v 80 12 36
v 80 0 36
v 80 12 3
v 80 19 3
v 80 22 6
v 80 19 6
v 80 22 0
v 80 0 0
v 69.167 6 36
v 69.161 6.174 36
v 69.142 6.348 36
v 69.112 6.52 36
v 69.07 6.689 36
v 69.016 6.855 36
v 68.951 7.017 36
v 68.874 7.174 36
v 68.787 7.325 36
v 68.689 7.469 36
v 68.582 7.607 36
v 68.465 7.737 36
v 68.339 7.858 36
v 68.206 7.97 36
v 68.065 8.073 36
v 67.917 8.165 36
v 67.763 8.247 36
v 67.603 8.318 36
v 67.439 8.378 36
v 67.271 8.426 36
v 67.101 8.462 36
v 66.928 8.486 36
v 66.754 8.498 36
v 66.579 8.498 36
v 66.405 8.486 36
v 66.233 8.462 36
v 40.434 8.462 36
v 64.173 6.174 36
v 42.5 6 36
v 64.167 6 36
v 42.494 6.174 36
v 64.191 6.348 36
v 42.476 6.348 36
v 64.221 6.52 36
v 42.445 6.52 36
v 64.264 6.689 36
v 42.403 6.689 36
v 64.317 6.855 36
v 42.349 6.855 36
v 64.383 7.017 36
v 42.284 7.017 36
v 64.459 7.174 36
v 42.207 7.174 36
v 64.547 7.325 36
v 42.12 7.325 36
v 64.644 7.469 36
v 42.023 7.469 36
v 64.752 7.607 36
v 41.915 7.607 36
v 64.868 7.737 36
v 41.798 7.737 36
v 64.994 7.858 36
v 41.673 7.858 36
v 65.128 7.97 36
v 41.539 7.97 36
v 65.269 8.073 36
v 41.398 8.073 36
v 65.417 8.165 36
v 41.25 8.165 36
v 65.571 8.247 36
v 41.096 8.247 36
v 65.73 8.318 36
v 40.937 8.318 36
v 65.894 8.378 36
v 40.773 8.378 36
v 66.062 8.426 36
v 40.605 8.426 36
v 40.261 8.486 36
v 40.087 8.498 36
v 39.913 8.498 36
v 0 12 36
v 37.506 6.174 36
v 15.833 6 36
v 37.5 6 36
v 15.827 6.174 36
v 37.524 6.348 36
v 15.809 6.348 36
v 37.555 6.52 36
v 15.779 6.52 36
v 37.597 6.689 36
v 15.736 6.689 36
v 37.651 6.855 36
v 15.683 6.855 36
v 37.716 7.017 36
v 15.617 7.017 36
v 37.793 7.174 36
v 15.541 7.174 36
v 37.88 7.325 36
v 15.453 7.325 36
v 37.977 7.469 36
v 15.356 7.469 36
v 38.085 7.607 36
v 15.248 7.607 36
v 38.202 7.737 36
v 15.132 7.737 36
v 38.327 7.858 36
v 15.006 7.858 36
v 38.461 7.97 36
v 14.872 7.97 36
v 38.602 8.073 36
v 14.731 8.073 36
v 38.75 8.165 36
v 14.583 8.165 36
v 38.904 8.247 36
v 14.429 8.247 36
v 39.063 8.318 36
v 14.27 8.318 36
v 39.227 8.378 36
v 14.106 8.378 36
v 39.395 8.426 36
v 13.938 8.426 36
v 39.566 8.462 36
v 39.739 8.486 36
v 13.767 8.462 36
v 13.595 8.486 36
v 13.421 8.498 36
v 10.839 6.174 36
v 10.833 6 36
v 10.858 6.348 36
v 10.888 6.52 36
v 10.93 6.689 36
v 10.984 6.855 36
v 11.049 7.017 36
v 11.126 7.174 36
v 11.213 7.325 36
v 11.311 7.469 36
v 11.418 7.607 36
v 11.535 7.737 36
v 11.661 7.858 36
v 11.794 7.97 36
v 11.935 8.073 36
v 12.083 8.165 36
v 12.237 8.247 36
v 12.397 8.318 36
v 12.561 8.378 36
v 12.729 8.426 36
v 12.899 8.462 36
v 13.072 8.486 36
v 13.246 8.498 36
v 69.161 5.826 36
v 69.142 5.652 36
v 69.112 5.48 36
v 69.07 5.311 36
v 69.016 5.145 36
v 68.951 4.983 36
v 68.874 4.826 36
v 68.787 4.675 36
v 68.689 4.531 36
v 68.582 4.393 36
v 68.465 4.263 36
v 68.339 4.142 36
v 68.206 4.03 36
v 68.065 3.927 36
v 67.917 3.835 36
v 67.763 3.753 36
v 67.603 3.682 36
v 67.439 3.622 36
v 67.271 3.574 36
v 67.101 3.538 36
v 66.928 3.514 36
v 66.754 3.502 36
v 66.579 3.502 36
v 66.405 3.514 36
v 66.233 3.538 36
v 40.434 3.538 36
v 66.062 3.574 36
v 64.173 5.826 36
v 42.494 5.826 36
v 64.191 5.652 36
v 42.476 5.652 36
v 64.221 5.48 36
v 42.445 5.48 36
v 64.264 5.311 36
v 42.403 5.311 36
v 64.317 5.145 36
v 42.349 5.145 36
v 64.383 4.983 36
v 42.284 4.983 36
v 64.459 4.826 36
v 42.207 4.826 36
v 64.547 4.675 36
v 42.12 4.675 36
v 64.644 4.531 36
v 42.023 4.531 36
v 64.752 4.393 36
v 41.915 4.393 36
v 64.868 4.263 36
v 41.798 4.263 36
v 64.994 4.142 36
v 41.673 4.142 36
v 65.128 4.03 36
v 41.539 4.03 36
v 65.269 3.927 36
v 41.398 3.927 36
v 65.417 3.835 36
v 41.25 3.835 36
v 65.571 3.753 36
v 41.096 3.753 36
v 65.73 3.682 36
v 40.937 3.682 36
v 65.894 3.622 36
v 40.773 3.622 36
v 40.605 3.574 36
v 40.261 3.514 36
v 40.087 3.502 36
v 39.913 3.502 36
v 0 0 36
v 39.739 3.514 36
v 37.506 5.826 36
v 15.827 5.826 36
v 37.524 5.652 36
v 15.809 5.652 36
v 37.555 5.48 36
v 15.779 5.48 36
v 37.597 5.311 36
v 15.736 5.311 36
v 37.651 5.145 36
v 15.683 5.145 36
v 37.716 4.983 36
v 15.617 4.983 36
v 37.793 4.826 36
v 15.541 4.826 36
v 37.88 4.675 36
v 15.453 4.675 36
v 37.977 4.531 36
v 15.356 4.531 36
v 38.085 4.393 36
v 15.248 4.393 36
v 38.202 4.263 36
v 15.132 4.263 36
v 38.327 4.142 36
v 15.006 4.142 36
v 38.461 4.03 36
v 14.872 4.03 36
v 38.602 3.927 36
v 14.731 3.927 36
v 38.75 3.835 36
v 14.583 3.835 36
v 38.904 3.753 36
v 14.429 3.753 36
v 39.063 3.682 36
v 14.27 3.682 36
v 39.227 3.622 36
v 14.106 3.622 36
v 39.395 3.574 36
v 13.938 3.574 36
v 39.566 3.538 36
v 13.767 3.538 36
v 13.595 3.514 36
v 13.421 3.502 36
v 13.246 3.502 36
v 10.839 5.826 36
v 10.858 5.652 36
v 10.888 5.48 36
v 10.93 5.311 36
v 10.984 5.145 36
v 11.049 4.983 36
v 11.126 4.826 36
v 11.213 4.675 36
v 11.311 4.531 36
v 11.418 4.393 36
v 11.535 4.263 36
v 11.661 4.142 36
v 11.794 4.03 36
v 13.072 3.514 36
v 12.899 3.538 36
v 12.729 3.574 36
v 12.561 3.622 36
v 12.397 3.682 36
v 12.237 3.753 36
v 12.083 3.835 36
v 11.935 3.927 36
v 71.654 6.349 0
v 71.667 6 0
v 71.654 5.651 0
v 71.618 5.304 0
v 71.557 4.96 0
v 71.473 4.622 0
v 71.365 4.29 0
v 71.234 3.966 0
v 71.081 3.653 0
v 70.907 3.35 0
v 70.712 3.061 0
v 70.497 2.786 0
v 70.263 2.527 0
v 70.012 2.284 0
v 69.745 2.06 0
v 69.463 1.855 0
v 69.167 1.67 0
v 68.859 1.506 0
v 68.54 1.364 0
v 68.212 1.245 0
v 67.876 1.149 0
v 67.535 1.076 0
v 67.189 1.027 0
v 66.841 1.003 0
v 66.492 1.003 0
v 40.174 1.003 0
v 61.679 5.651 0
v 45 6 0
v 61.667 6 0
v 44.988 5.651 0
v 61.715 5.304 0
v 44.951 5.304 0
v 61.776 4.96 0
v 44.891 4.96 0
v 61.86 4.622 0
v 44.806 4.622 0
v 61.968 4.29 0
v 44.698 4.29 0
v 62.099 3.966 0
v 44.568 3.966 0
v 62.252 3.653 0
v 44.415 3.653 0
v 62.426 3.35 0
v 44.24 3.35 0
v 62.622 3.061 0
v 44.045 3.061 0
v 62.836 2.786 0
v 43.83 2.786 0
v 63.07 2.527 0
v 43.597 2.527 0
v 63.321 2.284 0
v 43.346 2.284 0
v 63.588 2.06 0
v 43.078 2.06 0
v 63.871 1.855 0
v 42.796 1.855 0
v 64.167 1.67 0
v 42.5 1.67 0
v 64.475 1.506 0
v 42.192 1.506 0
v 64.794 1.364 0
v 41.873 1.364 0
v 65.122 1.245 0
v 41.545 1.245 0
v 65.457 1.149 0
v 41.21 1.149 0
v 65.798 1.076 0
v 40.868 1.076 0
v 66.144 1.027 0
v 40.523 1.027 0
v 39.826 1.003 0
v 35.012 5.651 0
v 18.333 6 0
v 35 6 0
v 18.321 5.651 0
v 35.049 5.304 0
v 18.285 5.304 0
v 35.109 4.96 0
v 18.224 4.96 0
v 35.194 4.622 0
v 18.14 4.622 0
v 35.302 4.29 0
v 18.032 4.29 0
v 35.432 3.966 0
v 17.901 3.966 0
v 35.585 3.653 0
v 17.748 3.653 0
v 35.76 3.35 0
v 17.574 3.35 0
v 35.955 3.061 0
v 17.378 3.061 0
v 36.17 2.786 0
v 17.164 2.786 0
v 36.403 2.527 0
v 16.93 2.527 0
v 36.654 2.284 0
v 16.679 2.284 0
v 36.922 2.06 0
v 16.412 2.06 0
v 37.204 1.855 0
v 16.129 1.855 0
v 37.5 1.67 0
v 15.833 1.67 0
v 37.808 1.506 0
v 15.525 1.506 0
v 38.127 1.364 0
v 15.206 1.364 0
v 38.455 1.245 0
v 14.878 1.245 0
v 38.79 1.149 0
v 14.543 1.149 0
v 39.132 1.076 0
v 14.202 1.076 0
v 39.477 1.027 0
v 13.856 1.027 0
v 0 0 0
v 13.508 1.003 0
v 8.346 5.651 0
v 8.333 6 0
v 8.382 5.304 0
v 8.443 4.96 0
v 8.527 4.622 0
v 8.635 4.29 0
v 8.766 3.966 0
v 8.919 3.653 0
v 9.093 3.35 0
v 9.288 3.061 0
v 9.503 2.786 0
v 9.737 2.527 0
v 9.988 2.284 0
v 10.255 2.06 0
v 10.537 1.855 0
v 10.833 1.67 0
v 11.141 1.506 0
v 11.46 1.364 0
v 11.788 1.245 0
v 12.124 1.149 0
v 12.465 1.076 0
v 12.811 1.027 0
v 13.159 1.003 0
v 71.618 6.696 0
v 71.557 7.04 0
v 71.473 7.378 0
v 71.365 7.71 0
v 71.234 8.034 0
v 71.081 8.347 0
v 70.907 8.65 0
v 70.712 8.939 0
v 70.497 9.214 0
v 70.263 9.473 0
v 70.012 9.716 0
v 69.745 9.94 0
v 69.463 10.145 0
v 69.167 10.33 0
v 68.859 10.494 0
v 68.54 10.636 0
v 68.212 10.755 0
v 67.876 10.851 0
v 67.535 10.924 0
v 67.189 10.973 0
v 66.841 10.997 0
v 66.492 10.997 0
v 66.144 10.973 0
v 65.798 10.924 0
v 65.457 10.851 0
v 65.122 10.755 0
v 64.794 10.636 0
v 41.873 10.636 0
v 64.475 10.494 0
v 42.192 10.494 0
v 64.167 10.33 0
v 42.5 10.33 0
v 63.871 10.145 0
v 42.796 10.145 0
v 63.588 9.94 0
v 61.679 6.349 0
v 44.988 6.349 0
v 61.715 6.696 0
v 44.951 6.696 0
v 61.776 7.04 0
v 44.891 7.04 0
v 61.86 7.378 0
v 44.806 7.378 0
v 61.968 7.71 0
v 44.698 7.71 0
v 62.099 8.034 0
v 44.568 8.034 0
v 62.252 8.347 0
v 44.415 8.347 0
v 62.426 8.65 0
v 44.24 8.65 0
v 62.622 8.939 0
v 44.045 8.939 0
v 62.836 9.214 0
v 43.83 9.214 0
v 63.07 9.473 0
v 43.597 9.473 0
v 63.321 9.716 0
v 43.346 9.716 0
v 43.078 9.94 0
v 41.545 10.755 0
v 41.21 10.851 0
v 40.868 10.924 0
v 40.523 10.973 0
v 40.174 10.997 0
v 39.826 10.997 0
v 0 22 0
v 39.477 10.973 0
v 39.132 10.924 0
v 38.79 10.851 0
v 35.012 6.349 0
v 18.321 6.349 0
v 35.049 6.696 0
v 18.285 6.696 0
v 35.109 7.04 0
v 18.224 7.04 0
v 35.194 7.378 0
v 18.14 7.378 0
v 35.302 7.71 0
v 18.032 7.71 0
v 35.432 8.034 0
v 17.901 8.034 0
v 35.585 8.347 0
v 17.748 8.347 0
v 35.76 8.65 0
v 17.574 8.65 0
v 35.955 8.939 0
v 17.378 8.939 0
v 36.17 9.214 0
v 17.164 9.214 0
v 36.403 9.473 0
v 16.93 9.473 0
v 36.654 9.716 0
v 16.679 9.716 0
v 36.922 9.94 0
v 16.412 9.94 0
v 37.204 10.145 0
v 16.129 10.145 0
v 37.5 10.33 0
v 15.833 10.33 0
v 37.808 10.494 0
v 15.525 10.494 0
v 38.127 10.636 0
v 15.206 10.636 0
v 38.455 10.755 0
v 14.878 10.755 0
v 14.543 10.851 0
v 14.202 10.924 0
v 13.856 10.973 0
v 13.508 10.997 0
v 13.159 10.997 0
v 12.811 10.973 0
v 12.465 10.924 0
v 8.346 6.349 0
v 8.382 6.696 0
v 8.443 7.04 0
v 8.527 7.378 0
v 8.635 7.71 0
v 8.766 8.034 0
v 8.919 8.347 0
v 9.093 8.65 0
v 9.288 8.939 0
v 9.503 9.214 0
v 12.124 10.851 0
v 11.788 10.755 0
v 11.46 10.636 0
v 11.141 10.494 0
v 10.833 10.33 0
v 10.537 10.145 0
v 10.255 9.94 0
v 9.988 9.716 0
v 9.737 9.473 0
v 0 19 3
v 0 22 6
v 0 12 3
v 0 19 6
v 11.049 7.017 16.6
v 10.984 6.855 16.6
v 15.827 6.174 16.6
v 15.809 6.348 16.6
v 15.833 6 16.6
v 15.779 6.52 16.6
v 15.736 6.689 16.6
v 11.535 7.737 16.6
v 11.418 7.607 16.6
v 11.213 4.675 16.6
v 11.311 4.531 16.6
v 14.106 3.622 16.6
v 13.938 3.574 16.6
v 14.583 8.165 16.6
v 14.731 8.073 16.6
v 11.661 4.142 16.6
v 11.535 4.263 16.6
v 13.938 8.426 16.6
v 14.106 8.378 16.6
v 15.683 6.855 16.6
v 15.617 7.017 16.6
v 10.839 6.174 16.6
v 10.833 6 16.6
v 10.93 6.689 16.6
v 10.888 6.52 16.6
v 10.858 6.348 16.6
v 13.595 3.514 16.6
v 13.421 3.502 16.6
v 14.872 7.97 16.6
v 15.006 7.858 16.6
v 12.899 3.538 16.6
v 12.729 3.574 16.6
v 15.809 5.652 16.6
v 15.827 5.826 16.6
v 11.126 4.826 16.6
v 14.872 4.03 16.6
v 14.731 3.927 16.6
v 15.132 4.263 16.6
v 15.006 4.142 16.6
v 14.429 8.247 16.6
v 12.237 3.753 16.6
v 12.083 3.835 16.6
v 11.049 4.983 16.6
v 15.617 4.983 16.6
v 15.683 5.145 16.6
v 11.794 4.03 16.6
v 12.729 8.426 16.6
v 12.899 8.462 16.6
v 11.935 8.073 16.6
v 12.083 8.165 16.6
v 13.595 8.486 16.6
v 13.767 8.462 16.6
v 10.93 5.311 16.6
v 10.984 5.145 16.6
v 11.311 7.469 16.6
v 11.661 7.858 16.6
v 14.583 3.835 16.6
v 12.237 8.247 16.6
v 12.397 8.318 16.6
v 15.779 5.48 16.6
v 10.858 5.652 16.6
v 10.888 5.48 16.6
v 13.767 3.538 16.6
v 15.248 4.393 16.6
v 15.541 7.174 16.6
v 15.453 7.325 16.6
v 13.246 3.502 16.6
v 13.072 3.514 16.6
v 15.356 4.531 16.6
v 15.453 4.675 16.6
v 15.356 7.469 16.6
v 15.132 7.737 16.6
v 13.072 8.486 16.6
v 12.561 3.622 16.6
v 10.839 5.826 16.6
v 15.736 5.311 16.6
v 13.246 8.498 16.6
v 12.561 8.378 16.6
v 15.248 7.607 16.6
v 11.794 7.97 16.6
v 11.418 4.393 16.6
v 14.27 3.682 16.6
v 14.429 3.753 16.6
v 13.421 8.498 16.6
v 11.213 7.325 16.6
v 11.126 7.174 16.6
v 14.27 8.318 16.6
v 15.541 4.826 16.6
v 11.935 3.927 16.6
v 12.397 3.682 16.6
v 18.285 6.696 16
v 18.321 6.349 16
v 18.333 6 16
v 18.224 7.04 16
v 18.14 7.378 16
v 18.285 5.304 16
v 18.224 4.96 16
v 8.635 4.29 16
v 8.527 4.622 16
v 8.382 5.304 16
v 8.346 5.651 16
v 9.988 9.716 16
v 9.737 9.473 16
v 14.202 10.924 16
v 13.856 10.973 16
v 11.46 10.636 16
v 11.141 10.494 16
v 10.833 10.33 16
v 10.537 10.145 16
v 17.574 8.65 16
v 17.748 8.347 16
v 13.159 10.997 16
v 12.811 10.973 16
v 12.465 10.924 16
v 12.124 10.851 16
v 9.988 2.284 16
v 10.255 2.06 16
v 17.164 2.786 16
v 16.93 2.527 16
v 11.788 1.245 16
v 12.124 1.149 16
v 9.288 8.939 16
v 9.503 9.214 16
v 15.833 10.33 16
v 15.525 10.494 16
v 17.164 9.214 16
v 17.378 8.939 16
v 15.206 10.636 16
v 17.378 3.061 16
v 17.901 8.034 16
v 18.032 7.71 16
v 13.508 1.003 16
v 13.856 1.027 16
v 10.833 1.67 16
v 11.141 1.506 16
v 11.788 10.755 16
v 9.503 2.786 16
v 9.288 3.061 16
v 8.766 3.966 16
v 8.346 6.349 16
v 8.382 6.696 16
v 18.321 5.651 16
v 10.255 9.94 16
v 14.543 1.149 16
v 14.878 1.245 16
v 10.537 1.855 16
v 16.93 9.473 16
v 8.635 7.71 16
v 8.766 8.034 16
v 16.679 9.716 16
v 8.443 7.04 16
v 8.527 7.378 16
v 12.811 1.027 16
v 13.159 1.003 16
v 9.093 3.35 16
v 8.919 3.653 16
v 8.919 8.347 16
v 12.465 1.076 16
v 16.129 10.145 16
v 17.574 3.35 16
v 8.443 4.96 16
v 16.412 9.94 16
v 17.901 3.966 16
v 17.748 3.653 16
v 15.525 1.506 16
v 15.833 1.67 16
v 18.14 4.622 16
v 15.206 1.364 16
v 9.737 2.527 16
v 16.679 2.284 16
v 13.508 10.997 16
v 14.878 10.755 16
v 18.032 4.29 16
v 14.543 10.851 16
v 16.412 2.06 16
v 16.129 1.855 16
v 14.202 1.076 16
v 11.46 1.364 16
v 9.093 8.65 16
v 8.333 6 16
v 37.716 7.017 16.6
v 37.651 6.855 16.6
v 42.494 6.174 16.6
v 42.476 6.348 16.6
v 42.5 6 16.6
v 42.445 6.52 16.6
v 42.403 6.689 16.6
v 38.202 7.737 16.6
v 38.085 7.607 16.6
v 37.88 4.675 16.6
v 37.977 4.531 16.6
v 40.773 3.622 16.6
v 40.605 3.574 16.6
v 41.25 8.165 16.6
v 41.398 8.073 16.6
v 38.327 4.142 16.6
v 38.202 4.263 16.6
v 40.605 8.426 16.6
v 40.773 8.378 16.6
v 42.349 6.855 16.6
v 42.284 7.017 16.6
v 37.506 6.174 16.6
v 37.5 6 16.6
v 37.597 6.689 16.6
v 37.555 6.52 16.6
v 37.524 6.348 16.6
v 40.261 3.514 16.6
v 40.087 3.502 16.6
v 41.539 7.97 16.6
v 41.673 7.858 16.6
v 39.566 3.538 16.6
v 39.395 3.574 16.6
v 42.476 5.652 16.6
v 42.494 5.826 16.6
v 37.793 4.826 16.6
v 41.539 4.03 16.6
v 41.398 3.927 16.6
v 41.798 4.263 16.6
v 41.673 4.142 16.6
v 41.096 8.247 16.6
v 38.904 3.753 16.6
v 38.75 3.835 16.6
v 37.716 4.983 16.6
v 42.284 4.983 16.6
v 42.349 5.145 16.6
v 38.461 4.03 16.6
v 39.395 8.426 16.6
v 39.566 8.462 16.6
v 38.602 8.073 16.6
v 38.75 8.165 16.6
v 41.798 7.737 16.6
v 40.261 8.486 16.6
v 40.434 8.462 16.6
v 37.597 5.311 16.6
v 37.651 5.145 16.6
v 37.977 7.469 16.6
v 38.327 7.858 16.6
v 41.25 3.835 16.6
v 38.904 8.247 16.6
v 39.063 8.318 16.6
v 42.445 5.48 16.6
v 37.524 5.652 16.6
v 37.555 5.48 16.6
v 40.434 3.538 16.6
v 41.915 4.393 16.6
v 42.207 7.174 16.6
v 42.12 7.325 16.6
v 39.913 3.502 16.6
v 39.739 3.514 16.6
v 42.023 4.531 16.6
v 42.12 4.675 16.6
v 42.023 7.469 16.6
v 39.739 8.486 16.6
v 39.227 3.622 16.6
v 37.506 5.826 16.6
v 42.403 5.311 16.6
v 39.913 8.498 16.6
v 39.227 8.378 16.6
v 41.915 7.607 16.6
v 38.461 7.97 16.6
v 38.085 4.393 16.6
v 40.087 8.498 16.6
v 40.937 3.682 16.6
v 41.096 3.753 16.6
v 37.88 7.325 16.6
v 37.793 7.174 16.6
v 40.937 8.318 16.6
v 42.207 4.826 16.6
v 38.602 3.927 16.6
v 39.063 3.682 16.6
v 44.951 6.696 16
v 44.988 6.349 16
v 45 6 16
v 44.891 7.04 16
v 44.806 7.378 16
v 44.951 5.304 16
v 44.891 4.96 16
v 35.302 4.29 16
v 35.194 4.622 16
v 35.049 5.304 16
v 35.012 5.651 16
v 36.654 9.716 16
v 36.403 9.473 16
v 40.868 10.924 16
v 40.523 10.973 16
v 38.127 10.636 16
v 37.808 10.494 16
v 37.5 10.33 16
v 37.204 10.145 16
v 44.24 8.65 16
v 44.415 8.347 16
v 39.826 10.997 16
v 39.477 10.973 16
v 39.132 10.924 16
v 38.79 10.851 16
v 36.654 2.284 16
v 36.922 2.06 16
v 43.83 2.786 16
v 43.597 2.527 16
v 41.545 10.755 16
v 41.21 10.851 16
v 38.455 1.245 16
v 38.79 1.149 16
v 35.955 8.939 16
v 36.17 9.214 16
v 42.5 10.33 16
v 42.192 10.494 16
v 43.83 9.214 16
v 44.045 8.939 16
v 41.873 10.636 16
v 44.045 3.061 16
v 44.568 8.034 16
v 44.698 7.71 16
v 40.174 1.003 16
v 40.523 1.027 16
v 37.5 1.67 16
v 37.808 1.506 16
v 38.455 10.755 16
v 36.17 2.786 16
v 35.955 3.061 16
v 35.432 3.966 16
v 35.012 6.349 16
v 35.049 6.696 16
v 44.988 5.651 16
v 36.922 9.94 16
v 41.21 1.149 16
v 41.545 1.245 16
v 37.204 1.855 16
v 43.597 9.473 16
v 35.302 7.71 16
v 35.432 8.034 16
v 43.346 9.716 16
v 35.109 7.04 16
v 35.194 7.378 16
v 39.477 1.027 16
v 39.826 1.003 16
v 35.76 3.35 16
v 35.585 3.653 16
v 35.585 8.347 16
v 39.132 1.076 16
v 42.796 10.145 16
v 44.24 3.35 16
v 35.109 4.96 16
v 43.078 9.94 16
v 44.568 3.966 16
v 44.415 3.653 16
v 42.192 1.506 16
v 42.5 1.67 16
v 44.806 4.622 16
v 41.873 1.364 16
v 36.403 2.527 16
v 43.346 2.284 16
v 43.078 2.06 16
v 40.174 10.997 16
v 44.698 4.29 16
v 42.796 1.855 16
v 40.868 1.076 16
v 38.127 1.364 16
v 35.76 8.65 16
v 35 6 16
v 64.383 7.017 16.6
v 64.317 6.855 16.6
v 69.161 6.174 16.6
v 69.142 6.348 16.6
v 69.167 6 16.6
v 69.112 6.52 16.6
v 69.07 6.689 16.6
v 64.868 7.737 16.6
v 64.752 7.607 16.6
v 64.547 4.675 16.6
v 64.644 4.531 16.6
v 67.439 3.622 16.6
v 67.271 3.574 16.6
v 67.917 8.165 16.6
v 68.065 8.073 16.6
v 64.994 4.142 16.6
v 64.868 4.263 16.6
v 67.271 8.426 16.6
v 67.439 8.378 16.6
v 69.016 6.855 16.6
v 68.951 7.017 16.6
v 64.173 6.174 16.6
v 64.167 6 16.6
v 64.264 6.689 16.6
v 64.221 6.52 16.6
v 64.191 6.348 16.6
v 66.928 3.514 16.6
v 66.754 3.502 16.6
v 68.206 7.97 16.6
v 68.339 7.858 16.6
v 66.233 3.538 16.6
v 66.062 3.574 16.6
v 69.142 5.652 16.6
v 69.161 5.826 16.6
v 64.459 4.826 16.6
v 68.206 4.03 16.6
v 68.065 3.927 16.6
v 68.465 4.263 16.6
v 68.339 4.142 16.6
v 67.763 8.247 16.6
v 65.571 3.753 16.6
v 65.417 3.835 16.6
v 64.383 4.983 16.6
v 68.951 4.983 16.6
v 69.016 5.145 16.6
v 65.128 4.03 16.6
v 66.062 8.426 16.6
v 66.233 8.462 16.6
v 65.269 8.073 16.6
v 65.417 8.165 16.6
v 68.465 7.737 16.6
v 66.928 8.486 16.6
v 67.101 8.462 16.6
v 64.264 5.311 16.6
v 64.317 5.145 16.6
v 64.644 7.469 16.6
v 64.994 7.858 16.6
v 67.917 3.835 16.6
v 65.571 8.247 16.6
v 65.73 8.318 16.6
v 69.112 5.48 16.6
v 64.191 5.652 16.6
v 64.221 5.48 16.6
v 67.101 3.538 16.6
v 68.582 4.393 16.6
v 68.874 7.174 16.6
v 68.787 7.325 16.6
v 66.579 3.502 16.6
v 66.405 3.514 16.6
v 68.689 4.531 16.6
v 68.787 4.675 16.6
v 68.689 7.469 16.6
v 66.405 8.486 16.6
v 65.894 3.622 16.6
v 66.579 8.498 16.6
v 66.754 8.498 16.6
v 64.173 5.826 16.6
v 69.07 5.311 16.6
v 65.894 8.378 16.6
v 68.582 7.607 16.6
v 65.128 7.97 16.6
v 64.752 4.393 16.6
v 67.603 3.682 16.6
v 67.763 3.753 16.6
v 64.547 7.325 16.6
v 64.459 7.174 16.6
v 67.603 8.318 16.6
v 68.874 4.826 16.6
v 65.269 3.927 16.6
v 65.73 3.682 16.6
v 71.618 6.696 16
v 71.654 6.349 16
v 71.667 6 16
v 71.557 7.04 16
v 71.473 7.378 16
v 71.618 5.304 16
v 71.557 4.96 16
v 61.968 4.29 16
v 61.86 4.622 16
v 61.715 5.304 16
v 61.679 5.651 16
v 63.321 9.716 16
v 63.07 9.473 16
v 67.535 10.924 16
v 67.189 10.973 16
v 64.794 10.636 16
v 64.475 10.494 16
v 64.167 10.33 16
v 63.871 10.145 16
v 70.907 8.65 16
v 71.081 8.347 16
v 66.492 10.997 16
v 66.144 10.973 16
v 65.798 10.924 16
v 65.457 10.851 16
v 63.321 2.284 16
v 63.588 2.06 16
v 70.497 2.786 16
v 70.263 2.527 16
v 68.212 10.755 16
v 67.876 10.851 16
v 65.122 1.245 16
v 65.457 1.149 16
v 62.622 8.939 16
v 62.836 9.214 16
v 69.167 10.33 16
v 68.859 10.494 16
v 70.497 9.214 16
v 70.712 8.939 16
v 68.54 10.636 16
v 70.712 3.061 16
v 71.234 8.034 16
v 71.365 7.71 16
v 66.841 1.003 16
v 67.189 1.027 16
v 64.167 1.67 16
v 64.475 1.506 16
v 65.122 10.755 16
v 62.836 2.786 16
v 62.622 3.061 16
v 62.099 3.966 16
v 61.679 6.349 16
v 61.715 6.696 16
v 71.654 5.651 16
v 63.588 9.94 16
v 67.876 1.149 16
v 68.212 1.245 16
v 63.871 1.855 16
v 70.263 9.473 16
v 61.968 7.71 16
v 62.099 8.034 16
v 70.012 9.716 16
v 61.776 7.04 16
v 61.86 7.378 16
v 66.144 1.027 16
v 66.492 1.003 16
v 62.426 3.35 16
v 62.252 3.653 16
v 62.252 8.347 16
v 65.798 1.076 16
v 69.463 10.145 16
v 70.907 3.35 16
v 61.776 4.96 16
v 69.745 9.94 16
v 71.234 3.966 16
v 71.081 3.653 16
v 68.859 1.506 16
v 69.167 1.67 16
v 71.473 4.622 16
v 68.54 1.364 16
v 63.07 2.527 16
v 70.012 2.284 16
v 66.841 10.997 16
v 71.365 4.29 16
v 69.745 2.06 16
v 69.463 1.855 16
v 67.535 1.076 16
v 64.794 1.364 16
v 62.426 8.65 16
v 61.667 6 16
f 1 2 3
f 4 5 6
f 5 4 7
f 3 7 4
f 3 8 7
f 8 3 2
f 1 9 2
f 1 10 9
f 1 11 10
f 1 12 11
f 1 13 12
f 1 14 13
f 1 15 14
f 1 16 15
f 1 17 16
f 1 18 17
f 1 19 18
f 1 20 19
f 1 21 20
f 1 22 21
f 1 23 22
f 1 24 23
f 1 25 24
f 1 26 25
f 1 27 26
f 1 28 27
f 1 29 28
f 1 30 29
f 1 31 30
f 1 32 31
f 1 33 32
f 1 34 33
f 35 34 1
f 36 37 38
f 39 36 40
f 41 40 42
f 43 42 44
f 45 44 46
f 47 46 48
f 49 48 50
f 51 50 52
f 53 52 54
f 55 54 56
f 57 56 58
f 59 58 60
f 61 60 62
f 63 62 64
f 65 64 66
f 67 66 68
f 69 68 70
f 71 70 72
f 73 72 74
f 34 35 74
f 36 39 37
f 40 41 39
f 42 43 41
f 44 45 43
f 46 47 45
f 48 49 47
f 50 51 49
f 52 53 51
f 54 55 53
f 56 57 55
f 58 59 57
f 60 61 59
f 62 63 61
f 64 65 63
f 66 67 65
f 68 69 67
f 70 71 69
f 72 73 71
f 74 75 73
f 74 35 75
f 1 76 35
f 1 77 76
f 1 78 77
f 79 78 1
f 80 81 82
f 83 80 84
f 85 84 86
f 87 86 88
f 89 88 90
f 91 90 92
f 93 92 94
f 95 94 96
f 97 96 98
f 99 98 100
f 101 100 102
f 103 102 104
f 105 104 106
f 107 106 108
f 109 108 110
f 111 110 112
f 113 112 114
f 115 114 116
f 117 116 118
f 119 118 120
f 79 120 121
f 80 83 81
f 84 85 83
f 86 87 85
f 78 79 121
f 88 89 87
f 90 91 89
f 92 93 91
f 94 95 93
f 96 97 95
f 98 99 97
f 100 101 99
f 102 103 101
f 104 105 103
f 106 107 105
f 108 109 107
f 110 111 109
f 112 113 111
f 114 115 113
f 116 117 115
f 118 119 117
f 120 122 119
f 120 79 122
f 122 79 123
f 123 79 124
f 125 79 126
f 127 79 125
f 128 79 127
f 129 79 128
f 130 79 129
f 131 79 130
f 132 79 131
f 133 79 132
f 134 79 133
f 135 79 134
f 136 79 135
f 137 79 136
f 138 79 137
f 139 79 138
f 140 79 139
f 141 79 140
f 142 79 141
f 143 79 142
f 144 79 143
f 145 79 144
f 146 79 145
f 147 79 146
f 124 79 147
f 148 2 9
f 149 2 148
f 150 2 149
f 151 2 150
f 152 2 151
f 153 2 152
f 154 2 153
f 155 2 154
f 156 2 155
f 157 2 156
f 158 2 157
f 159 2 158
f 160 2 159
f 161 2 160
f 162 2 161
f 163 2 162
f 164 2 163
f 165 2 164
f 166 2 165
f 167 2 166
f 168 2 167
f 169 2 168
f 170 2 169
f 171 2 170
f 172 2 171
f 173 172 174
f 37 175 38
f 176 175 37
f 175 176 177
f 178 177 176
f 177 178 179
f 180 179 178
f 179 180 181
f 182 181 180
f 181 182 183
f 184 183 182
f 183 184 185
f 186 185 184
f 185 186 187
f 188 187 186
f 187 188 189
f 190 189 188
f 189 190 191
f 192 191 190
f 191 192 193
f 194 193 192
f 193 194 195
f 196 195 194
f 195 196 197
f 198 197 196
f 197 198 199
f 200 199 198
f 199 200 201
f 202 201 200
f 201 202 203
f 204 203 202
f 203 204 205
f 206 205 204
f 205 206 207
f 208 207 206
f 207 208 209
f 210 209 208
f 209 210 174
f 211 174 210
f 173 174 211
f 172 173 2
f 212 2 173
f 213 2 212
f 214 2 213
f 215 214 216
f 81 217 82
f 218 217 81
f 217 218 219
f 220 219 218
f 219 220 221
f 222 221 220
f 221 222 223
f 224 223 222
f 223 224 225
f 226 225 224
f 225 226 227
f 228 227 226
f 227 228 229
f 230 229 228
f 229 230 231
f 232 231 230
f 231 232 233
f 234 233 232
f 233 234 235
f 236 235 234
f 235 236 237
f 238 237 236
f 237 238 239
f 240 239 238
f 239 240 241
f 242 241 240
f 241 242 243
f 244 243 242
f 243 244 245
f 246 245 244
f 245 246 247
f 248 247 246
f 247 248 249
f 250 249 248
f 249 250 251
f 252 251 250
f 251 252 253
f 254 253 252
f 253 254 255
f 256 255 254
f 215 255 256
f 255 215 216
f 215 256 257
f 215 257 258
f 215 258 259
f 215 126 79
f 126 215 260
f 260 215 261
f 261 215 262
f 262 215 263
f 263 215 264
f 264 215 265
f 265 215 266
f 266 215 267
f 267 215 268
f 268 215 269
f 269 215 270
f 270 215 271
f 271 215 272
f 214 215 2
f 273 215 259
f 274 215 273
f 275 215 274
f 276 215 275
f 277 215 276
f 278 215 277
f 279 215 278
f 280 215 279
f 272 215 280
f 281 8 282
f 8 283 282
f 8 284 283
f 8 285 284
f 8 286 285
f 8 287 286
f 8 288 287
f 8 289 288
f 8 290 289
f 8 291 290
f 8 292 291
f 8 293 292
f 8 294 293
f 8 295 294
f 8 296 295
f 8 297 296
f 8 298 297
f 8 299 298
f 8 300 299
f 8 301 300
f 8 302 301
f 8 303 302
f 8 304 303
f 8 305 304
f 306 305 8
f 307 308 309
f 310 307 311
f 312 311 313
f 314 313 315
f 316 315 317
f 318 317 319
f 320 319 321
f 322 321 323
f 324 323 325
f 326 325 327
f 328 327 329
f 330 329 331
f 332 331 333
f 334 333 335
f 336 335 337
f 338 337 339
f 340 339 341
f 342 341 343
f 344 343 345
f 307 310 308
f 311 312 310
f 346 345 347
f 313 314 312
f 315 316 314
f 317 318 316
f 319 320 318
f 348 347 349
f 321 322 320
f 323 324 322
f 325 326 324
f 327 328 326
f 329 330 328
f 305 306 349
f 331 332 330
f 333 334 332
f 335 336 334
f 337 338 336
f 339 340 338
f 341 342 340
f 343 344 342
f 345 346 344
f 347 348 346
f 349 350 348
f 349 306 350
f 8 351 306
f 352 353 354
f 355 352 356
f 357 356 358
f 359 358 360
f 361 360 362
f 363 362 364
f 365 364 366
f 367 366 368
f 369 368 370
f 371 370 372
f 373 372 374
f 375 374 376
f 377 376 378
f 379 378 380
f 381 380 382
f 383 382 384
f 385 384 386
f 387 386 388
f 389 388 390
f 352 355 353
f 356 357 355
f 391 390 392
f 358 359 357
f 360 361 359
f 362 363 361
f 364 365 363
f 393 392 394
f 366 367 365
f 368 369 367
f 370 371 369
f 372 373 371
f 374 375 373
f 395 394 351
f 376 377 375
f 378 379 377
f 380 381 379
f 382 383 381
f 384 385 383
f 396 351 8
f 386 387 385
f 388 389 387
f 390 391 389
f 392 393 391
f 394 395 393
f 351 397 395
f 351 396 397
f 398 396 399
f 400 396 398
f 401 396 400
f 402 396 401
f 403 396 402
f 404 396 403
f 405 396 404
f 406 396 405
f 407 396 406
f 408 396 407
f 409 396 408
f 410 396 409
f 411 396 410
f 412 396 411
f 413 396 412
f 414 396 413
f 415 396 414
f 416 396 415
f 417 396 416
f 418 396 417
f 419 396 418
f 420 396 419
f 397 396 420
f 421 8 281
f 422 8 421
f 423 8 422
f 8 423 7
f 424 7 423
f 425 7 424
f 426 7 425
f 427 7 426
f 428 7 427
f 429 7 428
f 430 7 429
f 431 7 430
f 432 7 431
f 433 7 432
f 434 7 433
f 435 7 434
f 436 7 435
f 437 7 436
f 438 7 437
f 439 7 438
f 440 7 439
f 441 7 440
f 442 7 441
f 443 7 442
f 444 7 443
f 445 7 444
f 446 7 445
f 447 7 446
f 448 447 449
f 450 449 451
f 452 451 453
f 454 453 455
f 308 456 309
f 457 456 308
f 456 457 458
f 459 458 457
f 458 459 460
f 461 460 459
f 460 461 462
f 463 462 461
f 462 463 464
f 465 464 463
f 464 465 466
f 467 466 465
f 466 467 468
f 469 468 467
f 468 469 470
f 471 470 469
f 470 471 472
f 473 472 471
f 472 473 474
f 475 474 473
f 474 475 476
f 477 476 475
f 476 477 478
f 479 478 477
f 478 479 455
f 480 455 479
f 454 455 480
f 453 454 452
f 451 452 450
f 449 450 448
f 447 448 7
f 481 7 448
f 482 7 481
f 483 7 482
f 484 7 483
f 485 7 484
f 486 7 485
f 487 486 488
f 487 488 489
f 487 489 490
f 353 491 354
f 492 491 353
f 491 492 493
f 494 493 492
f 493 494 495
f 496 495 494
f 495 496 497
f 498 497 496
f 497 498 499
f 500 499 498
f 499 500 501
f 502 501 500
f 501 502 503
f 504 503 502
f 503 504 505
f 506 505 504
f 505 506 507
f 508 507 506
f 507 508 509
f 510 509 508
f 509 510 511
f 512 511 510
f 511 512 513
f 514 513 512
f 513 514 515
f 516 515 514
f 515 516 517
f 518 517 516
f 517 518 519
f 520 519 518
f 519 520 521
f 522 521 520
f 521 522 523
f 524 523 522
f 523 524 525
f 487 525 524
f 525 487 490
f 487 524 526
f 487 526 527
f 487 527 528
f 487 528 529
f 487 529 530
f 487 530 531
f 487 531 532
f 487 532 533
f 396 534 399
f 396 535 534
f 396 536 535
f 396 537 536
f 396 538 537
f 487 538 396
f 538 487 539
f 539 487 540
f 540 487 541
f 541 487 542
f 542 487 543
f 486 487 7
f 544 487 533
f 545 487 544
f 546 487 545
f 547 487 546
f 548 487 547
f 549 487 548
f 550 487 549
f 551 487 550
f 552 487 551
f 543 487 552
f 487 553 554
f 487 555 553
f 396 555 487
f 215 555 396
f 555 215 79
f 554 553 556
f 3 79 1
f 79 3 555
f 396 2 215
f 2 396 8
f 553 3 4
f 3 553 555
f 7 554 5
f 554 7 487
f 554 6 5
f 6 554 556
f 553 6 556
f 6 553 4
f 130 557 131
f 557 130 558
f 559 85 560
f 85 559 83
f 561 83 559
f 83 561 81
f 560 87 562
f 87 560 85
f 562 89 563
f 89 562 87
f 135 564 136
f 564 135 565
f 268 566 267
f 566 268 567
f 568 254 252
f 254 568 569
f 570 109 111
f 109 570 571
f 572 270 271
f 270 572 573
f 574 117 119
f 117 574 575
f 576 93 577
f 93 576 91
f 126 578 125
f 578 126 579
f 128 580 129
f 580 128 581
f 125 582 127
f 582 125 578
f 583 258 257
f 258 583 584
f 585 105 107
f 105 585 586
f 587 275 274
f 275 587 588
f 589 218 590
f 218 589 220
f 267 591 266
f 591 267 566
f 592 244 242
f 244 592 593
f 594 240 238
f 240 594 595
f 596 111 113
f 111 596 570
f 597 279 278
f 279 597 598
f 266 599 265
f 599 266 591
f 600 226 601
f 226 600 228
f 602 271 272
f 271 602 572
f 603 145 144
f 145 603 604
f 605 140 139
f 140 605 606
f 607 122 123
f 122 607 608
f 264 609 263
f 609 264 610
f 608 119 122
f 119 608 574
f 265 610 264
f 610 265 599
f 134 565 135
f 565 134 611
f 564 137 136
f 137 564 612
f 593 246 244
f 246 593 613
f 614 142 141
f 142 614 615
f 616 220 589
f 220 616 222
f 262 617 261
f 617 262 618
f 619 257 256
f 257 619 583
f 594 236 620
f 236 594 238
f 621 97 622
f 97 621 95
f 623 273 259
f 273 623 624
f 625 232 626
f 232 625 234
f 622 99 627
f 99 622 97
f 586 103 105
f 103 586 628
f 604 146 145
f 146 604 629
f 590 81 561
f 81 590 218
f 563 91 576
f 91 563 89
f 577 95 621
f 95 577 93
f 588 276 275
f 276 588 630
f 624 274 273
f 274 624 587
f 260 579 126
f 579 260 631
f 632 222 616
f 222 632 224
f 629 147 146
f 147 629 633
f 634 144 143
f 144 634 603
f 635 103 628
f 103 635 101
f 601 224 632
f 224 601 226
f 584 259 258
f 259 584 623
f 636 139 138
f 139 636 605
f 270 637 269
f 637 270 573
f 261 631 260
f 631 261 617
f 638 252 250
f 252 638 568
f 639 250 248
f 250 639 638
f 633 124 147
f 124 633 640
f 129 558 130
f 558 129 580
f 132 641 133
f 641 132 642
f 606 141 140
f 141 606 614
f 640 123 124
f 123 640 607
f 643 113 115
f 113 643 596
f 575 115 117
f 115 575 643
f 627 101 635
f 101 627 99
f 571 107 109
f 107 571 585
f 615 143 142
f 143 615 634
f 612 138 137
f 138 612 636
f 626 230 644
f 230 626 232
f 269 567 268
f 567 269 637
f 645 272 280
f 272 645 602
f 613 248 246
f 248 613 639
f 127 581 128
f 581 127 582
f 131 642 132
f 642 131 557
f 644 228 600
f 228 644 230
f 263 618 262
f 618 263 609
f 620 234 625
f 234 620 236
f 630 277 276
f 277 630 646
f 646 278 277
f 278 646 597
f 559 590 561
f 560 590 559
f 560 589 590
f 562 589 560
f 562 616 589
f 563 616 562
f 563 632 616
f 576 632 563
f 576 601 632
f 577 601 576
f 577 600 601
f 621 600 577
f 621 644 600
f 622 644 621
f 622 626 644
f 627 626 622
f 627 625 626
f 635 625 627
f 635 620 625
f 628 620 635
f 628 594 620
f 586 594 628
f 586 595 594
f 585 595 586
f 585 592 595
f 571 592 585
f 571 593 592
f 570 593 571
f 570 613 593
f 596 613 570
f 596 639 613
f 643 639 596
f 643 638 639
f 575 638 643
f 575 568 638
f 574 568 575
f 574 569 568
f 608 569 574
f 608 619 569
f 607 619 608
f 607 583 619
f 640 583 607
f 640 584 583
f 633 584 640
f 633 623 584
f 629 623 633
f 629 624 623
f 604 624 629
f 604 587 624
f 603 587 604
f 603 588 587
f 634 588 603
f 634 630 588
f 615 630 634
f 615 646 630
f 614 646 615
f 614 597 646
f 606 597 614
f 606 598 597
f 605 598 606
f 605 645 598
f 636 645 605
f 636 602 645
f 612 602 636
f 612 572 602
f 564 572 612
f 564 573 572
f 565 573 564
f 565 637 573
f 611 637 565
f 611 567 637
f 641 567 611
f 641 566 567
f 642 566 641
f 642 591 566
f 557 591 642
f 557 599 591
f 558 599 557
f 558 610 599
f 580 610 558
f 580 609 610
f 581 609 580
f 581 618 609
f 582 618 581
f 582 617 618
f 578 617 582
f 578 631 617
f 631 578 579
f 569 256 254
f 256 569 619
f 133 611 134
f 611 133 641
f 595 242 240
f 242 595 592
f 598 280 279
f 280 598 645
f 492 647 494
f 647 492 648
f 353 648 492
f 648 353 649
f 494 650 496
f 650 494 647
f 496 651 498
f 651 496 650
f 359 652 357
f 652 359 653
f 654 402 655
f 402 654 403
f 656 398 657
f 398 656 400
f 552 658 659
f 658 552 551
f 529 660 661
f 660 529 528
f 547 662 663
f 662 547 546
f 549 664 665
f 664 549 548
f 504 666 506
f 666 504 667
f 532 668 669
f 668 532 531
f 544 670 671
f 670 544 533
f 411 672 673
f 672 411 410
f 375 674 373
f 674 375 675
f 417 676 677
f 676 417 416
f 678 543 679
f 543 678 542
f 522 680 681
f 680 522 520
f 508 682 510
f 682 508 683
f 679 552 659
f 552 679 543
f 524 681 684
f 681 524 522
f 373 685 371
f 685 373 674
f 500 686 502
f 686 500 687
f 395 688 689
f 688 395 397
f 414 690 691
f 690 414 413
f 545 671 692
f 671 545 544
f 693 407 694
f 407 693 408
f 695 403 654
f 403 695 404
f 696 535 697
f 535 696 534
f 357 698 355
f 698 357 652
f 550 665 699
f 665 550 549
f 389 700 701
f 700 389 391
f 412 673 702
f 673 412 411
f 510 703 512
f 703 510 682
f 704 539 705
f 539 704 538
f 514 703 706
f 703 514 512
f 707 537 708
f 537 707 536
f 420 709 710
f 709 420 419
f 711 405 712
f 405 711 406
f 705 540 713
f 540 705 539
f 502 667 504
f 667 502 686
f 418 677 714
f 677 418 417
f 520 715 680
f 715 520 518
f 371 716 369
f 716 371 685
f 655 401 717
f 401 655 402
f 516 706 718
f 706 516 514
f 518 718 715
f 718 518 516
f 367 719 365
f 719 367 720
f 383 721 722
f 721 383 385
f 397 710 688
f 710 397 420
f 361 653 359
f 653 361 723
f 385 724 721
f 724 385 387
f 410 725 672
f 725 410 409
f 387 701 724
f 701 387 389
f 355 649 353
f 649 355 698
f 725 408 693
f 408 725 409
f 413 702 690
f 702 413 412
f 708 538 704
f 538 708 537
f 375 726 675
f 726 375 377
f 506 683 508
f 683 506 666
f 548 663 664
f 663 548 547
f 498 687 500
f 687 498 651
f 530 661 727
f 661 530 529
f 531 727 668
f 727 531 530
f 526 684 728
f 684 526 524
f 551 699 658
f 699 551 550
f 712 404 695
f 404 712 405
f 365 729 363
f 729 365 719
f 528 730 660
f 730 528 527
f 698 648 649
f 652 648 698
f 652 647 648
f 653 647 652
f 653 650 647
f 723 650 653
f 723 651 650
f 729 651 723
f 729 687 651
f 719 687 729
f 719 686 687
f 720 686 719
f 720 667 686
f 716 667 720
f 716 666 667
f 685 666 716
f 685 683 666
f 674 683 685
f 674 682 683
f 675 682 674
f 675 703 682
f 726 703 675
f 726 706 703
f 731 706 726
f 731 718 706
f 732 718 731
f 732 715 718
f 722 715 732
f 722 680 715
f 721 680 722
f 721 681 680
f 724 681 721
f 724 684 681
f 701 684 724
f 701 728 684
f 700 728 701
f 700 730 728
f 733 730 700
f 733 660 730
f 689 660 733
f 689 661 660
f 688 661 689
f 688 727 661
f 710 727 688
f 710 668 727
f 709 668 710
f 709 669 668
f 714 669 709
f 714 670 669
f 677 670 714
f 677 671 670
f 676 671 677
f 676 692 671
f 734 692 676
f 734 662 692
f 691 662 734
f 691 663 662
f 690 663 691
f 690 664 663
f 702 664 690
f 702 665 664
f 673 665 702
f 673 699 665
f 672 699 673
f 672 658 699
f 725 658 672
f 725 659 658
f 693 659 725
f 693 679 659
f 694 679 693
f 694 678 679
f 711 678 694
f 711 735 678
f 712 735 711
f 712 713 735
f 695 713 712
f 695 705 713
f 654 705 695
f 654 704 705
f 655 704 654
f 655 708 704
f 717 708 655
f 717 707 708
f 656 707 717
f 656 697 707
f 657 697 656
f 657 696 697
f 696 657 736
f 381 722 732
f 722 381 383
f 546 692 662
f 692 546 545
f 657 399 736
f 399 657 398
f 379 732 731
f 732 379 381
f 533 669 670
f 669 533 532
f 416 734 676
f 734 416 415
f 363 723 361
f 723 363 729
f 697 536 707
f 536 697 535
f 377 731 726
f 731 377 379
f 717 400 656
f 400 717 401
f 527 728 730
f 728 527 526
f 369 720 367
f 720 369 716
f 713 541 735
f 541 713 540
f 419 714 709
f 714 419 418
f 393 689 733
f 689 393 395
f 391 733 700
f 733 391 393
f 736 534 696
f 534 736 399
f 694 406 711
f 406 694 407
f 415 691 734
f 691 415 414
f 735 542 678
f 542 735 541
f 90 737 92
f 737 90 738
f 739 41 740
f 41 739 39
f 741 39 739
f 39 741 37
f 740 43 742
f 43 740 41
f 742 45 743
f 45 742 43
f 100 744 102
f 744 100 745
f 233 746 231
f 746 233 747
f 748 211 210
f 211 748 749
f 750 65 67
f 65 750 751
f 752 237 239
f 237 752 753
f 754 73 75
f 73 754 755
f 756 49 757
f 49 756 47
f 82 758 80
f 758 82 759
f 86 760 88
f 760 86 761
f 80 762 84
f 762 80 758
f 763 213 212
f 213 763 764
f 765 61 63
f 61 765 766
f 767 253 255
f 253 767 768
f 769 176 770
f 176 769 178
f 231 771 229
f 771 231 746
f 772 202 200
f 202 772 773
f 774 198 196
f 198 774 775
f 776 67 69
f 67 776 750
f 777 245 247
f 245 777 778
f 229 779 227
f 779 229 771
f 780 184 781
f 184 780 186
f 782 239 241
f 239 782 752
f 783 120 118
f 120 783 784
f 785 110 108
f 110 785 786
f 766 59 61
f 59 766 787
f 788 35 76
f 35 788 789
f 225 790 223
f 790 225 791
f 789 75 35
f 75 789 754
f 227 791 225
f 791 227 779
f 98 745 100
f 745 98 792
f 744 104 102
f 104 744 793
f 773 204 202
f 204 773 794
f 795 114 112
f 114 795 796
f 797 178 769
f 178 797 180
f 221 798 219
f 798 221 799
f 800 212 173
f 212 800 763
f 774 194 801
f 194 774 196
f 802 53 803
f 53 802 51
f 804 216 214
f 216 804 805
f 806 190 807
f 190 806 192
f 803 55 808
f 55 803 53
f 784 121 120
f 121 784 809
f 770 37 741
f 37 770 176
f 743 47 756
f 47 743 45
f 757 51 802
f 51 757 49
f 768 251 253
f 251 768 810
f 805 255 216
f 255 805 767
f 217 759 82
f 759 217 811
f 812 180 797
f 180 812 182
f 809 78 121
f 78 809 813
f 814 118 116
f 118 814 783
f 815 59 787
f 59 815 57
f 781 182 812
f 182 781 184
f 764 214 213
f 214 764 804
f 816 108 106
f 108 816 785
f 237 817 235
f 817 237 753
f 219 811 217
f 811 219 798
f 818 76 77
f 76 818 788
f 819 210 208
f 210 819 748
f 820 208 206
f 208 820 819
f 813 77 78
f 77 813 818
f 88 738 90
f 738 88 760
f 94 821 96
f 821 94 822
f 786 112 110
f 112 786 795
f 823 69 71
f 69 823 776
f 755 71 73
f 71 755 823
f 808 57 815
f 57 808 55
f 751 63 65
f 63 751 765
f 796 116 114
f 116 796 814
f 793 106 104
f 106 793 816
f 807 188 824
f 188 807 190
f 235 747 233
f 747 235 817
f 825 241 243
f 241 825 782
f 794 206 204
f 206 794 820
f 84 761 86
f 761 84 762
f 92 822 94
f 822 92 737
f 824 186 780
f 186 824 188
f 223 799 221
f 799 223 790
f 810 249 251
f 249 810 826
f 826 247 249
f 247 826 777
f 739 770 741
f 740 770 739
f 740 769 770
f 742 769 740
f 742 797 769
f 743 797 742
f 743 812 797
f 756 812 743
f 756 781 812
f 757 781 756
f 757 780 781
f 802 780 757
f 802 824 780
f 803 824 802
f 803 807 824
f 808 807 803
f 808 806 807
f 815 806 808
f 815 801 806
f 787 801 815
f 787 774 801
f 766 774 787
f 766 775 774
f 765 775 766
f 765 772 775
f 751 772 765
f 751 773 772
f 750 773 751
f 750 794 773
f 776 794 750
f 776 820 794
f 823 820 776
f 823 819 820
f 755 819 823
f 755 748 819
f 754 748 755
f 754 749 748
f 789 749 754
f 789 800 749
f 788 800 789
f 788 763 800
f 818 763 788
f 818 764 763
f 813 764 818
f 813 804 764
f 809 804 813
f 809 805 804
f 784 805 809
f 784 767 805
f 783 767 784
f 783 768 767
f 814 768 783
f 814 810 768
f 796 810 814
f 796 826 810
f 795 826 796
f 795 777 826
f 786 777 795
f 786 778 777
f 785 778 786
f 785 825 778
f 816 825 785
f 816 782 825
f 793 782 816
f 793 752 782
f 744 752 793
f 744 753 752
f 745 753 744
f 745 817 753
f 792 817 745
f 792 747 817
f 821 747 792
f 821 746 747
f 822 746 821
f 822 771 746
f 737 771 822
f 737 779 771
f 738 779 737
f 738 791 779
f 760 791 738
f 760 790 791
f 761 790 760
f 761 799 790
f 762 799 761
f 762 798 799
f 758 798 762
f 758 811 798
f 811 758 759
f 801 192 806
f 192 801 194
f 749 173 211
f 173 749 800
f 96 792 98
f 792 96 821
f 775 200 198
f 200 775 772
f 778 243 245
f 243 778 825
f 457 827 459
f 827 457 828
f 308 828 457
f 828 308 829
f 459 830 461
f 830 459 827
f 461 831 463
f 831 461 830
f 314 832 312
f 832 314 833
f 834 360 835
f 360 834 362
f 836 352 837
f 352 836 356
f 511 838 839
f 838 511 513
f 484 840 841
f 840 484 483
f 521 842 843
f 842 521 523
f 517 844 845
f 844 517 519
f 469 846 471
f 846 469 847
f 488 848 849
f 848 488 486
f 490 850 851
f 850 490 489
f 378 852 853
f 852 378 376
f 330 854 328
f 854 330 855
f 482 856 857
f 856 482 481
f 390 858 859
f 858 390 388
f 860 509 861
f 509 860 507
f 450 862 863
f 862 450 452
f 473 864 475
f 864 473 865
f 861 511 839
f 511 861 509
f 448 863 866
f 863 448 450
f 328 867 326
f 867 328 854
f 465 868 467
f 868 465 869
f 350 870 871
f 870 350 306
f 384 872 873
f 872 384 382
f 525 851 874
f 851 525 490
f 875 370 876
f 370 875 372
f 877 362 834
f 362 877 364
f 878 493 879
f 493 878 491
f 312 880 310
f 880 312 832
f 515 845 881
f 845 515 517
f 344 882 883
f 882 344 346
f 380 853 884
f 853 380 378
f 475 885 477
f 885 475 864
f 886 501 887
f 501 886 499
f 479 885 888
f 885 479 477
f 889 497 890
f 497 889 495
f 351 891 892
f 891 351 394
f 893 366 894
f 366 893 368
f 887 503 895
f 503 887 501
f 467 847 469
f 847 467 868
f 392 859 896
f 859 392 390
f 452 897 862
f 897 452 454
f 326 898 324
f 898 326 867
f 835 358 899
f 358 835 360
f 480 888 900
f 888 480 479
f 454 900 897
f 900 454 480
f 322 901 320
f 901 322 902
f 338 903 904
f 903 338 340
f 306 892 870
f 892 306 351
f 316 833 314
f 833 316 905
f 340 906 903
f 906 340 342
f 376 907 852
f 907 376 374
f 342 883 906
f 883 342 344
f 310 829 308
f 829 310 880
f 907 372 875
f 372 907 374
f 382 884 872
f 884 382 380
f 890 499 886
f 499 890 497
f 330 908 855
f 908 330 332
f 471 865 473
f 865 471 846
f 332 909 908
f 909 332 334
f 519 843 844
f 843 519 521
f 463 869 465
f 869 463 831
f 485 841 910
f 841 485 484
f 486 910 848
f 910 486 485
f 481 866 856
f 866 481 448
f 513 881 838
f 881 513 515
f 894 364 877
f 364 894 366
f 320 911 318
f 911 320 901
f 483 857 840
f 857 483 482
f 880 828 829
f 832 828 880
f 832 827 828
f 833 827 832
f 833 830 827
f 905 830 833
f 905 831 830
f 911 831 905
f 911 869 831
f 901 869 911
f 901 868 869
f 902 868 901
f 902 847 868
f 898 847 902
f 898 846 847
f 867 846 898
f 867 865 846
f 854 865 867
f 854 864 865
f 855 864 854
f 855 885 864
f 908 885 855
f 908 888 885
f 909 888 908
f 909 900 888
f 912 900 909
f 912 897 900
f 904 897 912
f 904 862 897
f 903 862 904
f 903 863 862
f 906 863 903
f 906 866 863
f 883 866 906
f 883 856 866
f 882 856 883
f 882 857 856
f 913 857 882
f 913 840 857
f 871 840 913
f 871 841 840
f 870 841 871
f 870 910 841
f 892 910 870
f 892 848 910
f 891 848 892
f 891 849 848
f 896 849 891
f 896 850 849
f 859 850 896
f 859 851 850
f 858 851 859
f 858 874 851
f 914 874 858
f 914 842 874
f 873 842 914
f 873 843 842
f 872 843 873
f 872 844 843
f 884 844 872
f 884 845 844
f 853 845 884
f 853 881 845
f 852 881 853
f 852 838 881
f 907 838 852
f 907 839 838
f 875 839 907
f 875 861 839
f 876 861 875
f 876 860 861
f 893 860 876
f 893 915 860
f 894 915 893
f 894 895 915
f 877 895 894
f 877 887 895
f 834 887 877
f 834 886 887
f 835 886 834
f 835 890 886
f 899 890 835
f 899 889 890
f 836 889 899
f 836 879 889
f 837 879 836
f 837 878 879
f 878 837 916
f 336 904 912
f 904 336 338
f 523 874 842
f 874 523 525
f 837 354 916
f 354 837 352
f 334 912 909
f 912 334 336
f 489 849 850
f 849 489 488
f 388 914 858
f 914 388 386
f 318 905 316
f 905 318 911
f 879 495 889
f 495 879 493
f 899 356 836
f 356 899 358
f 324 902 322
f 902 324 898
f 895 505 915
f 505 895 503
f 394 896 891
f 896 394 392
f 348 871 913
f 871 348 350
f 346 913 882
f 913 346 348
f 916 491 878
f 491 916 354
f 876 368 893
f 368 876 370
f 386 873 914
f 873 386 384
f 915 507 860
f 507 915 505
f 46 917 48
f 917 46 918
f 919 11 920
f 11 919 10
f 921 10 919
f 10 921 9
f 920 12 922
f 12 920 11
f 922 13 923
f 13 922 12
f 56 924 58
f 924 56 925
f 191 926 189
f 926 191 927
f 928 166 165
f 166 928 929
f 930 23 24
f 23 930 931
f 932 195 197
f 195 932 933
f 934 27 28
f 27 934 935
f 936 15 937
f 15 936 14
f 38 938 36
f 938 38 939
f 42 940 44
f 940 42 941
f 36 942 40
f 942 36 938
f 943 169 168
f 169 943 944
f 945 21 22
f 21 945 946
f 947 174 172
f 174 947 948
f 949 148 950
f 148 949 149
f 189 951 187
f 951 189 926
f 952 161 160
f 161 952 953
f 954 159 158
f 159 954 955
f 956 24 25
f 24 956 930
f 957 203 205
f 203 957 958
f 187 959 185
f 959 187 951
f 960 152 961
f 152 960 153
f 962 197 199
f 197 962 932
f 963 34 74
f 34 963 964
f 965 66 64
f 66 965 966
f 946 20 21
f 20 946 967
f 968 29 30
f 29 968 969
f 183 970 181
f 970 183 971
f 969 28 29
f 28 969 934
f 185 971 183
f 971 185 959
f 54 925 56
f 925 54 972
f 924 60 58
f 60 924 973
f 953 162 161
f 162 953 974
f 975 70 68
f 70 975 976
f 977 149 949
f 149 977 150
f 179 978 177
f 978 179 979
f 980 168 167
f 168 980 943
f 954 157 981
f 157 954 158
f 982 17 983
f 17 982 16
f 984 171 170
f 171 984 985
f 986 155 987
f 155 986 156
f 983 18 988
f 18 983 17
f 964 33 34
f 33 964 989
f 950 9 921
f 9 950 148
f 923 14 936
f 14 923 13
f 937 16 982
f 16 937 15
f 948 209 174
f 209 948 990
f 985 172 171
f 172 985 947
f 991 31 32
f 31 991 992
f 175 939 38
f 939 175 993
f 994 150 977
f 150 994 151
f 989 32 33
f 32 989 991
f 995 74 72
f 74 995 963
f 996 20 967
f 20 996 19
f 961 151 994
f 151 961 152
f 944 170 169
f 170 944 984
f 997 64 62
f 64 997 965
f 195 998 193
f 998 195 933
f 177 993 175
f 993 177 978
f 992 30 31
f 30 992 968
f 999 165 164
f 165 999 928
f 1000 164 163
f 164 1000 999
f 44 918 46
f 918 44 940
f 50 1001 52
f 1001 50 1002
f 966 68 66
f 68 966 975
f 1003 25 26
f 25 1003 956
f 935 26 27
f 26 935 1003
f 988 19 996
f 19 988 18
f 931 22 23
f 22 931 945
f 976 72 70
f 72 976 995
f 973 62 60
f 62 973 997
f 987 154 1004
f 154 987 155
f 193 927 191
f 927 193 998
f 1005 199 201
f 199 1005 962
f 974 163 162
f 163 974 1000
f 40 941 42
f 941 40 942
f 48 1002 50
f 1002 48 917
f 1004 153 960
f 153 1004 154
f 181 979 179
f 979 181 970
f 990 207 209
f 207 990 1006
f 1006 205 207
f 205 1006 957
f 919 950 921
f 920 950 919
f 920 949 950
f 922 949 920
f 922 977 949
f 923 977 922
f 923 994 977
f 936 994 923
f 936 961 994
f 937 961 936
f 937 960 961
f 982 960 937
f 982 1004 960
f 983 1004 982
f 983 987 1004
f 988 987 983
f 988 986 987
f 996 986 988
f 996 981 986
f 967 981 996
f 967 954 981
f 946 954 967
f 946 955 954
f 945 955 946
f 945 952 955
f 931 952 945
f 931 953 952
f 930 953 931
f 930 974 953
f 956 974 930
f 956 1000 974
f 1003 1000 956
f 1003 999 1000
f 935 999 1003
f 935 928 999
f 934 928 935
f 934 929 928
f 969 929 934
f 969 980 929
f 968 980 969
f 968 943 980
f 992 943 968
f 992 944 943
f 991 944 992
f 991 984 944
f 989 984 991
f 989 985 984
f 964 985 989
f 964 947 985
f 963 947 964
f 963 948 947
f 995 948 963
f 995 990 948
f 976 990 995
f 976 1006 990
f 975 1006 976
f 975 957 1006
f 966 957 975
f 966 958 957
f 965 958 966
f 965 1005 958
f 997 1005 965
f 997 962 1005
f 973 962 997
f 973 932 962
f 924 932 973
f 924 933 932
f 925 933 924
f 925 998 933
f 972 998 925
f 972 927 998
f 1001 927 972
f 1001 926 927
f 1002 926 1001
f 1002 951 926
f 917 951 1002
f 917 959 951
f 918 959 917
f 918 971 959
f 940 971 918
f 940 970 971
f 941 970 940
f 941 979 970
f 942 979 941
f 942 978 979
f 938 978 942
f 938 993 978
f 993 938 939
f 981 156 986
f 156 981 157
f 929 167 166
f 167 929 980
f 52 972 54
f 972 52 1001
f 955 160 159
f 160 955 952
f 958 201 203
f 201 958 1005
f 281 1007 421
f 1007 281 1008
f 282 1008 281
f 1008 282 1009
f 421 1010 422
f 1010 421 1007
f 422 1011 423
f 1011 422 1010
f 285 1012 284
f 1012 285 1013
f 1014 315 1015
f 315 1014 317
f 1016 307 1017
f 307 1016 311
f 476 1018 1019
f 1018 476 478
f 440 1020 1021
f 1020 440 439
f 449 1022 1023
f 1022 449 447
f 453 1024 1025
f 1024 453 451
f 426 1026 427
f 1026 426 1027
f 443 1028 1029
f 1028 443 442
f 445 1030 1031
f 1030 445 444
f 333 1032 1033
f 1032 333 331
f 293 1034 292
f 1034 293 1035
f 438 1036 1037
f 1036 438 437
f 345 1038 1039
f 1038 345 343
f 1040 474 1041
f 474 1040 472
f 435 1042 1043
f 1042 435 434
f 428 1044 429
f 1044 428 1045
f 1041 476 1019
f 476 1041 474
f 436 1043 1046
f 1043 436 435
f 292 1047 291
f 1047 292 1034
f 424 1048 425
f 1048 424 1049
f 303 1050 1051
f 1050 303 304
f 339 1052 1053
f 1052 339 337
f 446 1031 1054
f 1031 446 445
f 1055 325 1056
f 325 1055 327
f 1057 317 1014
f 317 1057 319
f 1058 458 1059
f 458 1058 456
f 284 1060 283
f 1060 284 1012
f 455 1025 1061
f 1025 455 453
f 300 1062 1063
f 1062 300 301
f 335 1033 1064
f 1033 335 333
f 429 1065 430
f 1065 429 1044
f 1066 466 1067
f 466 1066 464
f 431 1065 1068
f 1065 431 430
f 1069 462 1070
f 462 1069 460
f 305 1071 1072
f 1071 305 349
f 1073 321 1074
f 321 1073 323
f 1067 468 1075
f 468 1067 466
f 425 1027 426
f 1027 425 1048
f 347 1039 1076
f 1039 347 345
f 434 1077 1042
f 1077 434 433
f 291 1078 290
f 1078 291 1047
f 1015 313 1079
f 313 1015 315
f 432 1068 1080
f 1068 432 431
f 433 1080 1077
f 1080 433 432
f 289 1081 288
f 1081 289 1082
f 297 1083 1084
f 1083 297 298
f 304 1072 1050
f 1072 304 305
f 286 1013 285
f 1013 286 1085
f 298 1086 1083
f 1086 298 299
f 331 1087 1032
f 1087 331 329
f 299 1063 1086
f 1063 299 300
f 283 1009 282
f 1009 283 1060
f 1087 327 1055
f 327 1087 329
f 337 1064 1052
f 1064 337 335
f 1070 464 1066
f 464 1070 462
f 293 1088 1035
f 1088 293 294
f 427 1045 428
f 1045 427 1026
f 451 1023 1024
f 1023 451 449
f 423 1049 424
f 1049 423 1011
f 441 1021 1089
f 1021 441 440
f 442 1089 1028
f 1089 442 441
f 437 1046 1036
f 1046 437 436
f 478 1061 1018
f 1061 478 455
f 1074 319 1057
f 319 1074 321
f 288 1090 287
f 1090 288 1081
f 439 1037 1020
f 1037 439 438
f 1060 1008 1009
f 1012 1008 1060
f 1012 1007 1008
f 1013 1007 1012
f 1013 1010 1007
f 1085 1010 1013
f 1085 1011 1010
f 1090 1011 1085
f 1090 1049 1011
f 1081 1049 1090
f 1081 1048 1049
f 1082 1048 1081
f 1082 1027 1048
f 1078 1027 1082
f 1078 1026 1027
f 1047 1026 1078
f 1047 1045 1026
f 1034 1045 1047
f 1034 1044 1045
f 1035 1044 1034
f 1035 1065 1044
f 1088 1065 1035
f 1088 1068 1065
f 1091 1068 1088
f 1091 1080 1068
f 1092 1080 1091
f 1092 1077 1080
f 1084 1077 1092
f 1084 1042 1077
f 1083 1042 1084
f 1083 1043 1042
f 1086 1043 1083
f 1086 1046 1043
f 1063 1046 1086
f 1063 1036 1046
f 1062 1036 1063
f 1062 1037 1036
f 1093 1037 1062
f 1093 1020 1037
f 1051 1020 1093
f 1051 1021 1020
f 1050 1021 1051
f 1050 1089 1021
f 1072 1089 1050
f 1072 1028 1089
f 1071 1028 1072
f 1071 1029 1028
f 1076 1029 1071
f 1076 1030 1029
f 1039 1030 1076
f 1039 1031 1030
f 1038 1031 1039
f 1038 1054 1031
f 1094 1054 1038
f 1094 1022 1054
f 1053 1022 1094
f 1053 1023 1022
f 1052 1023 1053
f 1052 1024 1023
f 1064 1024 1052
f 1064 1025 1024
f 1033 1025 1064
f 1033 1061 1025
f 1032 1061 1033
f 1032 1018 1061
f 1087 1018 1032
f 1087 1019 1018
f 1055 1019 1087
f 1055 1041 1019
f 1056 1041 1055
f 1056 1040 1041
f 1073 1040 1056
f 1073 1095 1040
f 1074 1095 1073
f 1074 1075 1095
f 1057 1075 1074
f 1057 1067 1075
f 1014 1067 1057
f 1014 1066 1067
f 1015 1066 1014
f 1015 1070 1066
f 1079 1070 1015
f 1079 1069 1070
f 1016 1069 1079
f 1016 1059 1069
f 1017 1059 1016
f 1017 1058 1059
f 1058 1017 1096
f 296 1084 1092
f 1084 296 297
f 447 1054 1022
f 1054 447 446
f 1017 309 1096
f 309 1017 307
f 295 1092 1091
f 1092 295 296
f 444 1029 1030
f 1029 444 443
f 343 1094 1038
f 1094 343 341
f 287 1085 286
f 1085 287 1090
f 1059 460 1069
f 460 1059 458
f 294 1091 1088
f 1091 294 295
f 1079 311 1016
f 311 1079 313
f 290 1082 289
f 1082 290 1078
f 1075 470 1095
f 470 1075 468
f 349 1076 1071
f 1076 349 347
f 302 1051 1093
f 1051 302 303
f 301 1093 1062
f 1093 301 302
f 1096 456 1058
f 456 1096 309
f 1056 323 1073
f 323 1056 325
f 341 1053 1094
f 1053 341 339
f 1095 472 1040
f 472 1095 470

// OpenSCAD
handle_z=30;
handle_x=80;
handle_y=7;

lip_z=3;
lip_x=handle_x;
lip_y=lip_z;

screw=5;
screw_h=20;
screw_head=10;

wall=1;
handle_gap=3;


base_z=handle_z+handle_gap+lip_z;
base_x=handle_x;
base_y=screw_head+wall*2;

gap_y=base_y+handle_y+lip_y;
gap_x=handle_x;
gap_z=lip_z;

base=[base_x,base_y,base_z];
lip_offset=[0,base_y+handle_y,0];
lip=[lip_x,lip_y,lip_z+gap_z];
gap=[gap_x,gap_y,gap_z];

pad=0.1;
screws=3;

no_supports=0.6;
$fn=90;

module screw(x=0) {
    translate([x,base_y/2,-pad]) {
        translate([0,0,base_z+pad-screw_h+no_supports])
        cylinder(d=screw,h=base_z+pad*2);
        cylinder(d=screw_head,h=base_z+pad-screw_h);
    }
}

module screws() {
    for(x=[base_x/screws/2:base_x/screws:base_x]) {
        screw(x);
    }
}

module base() {
    cube(base);
    cube(gap);
    translate(lip_offset)
    cube(lip);
}

difference() {
    base();
    screws();
}
